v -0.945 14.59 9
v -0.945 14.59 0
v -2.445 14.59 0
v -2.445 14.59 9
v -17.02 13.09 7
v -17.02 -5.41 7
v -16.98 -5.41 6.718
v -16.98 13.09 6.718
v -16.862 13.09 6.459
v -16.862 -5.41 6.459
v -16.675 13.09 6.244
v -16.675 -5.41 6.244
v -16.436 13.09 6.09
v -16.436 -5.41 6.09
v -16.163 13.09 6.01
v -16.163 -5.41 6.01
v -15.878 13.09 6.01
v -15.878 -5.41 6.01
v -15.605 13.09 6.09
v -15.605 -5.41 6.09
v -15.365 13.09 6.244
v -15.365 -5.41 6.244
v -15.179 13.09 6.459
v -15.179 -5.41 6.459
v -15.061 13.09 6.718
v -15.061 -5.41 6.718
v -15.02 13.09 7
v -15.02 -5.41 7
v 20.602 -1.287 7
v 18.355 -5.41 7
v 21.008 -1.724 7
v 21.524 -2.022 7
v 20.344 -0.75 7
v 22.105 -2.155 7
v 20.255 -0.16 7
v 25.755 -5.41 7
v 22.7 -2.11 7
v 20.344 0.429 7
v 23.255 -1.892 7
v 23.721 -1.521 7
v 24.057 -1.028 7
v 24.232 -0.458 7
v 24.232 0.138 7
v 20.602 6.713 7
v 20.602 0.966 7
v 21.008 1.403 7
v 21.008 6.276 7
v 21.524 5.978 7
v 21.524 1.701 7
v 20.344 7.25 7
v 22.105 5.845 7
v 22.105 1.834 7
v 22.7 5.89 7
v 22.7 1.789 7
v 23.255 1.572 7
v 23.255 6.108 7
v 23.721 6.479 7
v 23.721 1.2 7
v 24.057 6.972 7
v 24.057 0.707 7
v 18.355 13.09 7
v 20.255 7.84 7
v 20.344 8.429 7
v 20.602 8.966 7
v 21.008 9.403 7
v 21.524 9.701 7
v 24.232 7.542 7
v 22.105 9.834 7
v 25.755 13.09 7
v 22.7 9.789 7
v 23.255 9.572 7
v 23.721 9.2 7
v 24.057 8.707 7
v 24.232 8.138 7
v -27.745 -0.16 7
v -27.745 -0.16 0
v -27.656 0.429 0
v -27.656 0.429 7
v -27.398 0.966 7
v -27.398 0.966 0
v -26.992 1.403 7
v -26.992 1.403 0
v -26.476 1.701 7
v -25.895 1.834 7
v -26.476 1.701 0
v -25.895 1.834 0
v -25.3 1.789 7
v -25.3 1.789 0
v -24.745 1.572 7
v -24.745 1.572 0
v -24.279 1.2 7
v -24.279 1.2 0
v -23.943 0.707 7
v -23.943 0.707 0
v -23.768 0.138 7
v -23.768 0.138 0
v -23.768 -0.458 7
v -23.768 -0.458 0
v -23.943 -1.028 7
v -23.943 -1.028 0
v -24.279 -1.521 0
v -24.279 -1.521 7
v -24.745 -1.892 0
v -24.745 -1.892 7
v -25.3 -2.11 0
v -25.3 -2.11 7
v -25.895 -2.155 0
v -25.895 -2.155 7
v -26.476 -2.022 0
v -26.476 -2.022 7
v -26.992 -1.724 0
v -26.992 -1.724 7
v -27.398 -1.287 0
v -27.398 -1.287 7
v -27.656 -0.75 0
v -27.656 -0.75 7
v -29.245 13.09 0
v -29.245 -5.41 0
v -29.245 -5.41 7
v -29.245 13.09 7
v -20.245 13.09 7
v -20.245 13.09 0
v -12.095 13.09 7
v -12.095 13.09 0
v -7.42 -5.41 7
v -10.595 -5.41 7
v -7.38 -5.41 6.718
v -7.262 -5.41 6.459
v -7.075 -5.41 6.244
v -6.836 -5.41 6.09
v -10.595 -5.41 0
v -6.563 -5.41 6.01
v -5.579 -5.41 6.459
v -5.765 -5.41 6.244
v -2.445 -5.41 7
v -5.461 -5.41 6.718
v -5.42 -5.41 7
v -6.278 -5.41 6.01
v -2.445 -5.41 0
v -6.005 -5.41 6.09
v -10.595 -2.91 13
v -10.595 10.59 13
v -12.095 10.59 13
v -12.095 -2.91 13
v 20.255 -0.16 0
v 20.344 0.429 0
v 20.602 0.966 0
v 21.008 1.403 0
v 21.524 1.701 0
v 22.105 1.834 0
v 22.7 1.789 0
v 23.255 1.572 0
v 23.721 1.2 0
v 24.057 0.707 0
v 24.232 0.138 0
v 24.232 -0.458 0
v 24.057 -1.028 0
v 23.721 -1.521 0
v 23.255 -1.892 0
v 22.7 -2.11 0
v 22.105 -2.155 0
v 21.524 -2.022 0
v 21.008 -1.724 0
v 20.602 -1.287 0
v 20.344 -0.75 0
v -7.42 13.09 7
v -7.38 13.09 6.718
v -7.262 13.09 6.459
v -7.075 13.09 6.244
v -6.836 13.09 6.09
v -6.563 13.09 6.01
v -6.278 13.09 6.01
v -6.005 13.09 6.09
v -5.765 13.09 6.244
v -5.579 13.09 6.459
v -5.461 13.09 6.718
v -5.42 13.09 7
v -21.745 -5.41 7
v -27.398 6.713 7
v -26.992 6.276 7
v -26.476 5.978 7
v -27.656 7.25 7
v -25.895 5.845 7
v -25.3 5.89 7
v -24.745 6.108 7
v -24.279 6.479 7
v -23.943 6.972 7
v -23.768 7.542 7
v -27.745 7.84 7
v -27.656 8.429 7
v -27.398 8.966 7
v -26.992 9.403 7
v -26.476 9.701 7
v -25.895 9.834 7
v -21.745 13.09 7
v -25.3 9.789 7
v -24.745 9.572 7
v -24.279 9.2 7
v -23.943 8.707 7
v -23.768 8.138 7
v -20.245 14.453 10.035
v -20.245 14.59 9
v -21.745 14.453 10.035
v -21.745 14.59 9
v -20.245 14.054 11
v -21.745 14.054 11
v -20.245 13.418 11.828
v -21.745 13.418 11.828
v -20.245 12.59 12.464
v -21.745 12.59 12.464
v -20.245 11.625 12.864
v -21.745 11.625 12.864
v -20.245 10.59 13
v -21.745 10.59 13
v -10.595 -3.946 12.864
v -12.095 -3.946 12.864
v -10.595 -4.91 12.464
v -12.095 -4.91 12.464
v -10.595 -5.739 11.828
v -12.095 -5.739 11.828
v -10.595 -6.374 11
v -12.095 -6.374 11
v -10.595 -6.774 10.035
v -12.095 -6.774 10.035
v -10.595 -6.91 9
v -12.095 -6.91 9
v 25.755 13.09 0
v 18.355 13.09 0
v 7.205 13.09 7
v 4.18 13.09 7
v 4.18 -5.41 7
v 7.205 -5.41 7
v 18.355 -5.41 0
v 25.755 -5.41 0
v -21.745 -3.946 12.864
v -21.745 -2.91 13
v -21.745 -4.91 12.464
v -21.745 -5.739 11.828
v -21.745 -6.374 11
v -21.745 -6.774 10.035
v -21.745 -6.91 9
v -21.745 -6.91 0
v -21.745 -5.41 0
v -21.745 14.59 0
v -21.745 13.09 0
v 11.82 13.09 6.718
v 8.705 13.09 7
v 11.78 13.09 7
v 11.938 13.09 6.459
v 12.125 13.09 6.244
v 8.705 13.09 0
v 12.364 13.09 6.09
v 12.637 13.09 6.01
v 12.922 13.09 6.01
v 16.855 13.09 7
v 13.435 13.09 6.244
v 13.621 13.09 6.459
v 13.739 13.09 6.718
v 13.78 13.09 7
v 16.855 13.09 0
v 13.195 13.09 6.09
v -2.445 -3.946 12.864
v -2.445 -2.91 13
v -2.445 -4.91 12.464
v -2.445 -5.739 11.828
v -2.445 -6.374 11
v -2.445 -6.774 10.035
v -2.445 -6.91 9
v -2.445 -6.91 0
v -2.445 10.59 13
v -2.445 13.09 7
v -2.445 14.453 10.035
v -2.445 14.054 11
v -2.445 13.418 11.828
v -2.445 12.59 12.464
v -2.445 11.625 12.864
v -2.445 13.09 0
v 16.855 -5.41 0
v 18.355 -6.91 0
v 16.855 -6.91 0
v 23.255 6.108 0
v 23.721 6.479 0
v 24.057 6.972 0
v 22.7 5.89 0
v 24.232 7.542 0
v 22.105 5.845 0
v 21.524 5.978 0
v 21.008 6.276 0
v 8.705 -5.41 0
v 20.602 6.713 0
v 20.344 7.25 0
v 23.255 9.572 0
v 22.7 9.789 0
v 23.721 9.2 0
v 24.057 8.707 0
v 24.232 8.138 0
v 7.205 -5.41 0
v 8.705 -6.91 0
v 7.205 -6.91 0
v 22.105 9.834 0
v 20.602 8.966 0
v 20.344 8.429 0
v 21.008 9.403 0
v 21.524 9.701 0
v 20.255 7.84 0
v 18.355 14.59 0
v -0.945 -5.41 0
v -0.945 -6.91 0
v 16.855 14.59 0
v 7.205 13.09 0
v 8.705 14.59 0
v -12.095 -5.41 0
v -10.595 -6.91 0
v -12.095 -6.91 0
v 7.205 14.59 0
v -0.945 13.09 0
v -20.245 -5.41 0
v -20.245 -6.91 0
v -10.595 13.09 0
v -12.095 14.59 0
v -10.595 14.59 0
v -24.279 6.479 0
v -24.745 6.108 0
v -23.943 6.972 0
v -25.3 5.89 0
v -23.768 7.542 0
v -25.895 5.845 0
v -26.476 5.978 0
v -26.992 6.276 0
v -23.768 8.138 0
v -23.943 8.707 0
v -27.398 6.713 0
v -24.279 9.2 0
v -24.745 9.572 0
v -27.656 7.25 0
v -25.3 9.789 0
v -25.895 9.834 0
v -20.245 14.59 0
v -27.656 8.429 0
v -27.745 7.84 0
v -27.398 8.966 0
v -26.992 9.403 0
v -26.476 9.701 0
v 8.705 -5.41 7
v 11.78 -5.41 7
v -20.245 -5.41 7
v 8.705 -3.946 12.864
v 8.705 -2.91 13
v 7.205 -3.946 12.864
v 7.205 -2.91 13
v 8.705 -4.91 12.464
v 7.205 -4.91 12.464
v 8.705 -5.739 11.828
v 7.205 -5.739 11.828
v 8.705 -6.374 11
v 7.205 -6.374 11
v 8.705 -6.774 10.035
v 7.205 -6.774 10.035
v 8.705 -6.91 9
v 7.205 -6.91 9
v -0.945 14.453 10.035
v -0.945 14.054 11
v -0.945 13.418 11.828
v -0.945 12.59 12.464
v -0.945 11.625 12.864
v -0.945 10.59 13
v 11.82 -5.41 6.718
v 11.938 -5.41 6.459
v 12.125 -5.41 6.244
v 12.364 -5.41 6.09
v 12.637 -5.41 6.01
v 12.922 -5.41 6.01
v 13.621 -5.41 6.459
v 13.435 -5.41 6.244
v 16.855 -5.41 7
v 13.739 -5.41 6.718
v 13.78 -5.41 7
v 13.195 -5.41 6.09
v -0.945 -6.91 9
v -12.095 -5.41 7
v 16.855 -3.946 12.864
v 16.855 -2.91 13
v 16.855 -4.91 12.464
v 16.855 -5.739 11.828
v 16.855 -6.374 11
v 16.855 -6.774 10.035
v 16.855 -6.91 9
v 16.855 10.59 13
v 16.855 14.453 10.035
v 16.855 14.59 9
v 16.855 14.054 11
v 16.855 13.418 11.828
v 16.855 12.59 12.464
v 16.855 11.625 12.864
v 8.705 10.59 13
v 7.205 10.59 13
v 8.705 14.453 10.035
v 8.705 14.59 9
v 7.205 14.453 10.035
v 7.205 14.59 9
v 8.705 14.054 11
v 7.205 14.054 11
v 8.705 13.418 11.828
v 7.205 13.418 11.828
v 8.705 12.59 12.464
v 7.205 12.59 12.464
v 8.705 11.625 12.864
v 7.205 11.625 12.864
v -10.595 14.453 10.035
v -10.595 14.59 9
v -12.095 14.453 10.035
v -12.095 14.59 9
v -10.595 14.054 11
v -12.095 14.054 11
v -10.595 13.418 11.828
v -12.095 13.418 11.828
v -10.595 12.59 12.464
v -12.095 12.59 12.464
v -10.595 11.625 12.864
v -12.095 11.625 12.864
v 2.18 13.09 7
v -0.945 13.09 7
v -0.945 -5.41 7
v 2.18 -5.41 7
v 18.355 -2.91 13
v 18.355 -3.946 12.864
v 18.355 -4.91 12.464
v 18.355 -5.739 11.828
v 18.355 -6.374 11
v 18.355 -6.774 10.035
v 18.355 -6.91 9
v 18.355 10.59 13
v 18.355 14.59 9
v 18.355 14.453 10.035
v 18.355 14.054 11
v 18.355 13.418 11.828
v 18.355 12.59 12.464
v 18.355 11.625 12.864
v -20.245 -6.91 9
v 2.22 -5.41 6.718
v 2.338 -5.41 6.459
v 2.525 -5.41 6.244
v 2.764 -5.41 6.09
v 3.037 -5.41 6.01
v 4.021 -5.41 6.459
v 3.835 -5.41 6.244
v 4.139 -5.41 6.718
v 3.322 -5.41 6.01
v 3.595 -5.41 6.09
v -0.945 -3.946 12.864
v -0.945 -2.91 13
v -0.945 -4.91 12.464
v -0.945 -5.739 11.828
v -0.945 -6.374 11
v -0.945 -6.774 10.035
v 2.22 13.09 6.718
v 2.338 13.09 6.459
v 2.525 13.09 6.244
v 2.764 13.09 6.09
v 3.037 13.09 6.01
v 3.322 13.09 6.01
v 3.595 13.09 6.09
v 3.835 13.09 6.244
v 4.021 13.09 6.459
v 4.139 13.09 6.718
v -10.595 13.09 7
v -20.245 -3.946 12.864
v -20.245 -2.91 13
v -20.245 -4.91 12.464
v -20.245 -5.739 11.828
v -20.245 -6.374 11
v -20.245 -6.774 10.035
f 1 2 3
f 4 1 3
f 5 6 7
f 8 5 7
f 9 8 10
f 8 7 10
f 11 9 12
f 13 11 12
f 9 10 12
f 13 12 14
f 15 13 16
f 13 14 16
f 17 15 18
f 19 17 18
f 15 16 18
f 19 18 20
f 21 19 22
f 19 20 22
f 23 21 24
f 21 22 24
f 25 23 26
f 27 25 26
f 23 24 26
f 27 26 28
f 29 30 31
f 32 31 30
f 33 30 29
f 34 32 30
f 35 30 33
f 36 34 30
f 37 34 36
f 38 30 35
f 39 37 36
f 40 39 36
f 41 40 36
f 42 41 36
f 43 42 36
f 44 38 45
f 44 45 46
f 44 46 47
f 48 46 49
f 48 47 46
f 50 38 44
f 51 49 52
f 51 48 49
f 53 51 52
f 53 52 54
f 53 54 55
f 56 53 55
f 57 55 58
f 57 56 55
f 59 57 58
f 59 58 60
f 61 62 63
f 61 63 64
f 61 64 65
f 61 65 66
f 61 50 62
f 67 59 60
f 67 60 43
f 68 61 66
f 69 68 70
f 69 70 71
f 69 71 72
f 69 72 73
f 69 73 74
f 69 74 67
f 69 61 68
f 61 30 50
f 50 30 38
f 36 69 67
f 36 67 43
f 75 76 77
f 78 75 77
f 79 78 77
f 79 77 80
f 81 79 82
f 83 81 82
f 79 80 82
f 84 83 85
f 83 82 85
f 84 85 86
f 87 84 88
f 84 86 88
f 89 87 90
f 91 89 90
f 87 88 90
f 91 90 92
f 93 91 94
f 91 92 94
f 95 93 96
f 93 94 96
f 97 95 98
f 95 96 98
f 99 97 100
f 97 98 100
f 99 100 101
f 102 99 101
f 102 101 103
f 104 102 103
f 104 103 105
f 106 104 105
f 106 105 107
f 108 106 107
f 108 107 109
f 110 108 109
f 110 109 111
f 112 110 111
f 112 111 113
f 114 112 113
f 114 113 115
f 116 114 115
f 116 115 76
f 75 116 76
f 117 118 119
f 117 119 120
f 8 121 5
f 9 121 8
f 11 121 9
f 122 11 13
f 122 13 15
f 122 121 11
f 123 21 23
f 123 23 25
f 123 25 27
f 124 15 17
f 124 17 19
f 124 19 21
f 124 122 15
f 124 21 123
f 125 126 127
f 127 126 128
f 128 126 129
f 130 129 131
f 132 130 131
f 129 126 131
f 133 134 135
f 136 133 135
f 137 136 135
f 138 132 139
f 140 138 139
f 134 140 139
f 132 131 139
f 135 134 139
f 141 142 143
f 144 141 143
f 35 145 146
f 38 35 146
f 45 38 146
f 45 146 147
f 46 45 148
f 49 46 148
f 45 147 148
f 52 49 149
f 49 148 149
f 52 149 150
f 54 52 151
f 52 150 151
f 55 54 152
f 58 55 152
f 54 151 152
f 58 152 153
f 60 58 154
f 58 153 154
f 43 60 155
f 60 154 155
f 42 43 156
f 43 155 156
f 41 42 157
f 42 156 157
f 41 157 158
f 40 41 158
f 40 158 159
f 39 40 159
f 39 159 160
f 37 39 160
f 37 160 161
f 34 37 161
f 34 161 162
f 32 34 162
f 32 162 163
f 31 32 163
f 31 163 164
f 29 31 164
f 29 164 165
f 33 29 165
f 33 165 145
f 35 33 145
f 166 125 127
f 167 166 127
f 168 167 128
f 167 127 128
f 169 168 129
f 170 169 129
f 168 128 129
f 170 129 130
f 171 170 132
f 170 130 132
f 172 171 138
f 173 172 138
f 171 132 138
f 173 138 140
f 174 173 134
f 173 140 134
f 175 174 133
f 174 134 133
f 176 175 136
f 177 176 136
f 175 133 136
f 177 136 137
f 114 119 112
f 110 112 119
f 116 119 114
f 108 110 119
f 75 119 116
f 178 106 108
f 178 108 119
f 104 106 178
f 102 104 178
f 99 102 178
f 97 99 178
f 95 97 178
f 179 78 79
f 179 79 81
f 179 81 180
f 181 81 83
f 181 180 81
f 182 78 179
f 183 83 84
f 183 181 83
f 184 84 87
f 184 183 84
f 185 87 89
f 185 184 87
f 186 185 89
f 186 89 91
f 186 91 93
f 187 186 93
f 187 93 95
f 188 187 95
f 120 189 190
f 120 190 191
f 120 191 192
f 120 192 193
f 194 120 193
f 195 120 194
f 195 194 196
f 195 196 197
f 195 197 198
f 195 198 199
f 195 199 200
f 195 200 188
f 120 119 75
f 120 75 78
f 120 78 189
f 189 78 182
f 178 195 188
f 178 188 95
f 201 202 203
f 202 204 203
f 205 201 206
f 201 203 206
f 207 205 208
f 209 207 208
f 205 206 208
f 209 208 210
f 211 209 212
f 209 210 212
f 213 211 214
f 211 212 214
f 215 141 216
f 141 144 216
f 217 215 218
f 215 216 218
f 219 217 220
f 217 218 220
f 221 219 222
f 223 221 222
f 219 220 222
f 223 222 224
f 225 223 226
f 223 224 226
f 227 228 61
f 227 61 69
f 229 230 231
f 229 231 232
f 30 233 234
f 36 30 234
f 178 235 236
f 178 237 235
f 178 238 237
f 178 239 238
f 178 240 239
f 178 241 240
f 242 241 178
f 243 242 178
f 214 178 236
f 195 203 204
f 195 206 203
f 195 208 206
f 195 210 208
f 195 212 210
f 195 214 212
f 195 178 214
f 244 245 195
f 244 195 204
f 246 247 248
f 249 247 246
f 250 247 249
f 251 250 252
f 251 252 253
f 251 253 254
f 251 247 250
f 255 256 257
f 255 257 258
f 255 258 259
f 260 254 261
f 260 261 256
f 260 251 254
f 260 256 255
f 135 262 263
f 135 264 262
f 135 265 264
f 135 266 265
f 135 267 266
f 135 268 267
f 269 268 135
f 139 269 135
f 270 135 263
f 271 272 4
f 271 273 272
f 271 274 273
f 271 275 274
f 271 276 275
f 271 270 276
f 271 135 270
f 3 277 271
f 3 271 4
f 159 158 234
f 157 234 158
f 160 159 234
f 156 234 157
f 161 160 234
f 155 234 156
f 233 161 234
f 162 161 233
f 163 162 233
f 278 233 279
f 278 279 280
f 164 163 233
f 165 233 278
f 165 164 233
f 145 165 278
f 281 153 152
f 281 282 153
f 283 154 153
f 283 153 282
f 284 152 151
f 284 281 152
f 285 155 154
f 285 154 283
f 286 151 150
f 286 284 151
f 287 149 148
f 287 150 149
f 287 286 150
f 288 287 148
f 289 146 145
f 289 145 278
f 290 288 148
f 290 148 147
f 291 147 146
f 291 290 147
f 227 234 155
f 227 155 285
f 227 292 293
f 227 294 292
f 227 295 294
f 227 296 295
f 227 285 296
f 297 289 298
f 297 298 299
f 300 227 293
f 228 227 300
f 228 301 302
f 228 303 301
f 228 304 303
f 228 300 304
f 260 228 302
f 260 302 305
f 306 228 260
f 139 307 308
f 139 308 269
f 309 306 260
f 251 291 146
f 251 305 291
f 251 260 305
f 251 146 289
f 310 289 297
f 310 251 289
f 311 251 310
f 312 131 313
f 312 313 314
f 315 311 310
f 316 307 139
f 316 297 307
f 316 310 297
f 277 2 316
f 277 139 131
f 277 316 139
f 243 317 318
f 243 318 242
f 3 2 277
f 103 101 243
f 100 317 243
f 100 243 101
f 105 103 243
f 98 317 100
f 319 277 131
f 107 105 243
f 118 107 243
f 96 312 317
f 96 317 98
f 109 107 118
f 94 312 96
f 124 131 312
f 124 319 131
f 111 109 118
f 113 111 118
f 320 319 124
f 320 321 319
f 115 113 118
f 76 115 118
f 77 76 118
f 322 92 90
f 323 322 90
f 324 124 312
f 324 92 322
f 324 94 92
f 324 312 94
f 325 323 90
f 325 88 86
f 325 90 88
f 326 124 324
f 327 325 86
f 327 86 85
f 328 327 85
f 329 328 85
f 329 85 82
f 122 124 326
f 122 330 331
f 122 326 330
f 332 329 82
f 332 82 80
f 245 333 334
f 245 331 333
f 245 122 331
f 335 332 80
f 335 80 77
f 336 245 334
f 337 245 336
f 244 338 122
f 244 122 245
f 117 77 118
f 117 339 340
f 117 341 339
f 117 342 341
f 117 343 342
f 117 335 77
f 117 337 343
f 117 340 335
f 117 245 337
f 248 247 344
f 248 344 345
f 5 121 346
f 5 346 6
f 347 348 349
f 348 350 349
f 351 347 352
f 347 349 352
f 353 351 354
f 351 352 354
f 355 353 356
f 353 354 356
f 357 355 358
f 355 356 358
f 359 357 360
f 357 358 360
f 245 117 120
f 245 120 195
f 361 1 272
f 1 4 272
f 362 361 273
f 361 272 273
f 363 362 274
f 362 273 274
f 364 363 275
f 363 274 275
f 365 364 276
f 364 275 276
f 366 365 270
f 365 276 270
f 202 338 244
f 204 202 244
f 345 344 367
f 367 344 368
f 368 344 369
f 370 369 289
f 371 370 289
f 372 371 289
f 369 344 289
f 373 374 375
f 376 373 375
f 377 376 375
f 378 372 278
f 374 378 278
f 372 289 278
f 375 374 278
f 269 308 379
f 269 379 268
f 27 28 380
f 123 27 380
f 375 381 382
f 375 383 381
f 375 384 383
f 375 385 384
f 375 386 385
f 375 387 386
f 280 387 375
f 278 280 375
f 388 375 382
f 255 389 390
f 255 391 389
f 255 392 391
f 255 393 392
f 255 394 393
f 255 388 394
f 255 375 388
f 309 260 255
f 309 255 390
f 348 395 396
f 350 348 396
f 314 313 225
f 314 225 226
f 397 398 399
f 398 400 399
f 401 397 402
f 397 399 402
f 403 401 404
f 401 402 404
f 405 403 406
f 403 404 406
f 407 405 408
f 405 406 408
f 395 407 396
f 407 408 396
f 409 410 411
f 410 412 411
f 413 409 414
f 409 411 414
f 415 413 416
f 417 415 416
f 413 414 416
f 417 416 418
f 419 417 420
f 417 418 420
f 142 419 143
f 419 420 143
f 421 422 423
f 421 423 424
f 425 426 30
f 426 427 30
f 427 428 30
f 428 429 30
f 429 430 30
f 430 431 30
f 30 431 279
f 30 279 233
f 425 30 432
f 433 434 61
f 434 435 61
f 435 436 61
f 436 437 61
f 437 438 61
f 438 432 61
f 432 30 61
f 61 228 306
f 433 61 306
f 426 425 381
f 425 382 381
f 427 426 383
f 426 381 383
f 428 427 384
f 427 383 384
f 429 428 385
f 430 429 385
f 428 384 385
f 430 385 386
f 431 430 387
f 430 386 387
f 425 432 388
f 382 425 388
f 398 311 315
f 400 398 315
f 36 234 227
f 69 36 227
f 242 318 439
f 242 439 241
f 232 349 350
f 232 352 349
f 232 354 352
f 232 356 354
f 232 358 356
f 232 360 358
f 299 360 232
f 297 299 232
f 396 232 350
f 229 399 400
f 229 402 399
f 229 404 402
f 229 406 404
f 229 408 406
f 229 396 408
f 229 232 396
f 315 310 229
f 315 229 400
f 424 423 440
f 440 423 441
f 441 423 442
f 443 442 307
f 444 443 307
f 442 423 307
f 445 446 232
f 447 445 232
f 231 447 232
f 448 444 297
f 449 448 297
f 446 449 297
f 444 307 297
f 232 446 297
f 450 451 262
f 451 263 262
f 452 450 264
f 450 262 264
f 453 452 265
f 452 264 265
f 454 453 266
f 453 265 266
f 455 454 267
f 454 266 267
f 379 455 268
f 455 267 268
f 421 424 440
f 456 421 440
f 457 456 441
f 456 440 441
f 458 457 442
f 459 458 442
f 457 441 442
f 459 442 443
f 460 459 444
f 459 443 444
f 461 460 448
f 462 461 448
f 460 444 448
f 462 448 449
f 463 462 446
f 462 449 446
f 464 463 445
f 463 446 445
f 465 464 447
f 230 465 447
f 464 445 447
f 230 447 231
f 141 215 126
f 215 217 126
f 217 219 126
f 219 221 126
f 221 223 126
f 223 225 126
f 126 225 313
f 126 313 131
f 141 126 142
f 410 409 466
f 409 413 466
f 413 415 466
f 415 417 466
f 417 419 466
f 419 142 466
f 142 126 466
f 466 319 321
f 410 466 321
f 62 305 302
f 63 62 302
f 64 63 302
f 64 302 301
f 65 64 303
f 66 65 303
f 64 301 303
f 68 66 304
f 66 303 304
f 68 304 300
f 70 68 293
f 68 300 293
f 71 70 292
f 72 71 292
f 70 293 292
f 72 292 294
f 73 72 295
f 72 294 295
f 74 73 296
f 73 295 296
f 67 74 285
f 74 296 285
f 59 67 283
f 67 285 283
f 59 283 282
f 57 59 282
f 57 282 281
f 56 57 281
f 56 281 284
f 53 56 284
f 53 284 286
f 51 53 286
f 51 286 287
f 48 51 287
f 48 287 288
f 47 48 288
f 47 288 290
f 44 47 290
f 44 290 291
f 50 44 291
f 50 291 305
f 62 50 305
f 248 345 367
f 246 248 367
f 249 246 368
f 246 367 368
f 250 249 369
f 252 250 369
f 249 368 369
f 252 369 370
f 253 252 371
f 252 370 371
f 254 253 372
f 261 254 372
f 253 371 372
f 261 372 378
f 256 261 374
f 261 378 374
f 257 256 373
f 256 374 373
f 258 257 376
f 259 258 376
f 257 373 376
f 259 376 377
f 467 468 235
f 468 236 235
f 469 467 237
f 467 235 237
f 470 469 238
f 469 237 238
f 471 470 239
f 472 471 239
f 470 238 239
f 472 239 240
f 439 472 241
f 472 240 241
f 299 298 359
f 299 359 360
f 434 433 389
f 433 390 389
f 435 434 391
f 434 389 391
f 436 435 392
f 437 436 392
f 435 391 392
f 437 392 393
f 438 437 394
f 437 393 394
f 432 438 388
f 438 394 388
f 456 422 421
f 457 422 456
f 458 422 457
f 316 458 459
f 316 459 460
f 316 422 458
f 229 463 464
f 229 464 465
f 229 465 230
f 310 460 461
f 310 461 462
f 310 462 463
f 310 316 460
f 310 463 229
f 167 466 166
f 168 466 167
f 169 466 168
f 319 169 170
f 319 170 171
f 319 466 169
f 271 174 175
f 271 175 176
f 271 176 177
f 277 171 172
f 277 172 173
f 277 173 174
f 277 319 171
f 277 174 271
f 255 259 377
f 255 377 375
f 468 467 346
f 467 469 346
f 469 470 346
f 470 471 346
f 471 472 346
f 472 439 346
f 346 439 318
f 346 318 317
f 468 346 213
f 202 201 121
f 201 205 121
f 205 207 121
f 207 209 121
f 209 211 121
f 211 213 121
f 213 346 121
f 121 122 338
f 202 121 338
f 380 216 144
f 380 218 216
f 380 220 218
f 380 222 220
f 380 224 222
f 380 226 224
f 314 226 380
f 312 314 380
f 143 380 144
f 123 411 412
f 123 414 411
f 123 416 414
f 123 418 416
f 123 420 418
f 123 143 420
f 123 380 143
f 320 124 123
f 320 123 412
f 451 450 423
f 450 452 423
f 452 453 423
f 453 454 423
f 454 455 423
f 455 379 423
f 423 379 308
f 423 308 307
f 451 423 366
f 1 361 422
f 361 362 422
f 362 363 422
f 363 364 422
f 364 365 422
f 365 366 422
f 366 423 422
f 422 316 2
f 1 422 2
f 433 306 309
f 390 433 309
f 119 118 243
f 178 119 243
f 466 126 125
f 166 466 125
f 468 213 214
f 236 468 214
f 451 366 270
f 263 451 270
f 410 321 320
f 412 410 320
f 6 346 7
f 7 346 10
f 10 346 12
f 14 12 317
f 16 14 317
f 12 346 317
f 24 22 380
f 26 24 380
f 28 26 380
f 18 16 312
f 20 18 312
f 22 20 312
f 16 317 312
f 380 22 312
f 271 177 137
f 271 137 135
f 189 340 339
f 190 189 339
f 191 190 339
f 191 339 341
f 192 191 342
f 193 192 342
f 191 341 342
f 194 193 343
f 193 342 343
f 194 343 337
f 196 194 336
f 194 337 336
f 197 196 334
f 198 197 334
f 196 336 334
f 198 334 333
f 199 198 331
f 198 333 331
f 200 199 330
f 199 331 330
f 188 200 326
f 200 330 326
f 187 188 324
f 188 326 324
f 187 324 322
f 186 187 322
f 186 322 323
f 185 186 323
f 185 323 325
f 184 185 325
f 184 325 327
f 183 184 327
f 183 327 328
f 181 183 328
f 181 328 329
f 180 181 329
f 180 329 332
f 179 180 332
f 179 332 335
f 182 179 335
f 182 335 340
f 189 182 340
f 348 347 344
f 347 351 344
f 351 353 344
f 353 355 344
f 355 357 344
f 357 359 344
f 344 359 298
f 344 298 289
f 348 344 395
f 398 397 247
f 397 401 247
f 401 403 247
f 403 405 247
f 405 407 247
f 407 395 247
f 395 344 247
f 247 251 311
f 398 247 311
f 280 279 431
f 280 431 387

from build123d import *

# Parameters (mm, degrees)
ESQUISSE1_W                = 55
ESQUISSE1_H                = 18.5
BOSS_EXTRU_1_DEPTH         = 7
ENL_V_MAT_EXTRU_1_REACH    = 9
ESQUISSE2_R                = 2
ESQUISSE3_W                = 1.5
ESQUISSE3_H                = 21.5
BOSS_EXTRU_2_DEPTH         = 13
CONG_1_R                   = 4
ESQUISSE4_R                = 1
ENL_V_MAT_EXTRU_2_DEPTH    = 18.5
R_P_TITION_LIN_AIRE1_COUNT = 4
R_P_TITION_LIN_AIRE1_PITCH = 9.6


with BuildPart() as part:
    # Esquisse1 → Boss.-Extru.1 (new body)
    with BuildSketch(Plane.XY):
        with Locations((-1.745283019, 3.839622642)):
            Rectangle(ESQUISSE1_W, ESQUISSE1_H)
    extrude(amount=BOSS_EXTRU_1_DEPTH)

    # Esquisse2 → Enlèv. mat.-Extru.1 (cut, up to next)
    with BuildSketch(Plane(origin=(0, 0, 0), x_dir=(-1, 0, 0), z_dir=(0, 0, -1)), mode=Mode.PRIVATE) as enl_v_mat_extru_1_sk1:
        with Locations((-22.254716981, 7.839622642)):
            Circle(ESQUISSE2_R)
    enl_v_mat_extru_1_tool1 = extrude(enl_v_mat_extru_1_sk1.sketch, amount=-ENL_V_MAT_EXTRU_1_REACH, mode=Mode.PRIVATE) & part.part
    add(enl_v_mat_extru_1_tool1.solids().sort_by_distance((22.254717, 7.839623, 0))[0], mode=Mode.SUBTRACT)
    # Esquisse2 → Enlèv. mat.-Extru.1 (cut, up to next)
    with BuildSketch(Plane(origin=(0, 0, 0), x_dir=(-1, 0, 0), z_dir=(0, 0, -1)), mode=Mode.PRIVATE) as enl_v_mat_extru_1_sk2:
        with Locations((-22.254716981, -0.160377358)):
            Circle(ESQUISSE2_R)
    enl_v_mat_extru_1_tool2 = extrude(enl_v_mat_extru_1_sk2.sketch, amount=-ENL_V_MAT_EXTRU_1_REACH, mode=Mode.PRIVATE) & part.part
    add(enl_v_mat_extru_1_tool2.solids().sort_by_distance((22.254717, -0.160377, 0))[0], mode=Mode.SUBTRACT)
    # Esquisse2 → Enlèv. mat.-Extru.1 (cut, up to next)
    with BuildSketch(Plane(origin=(0, 0, 0), x_dir=(-1, 0, 0), z_dir=(0, 0, -1)), mode=Mode.PRIVATE) as enl_v_mat_extru_1_sk3:
        with Locations((25.745283019, -0.160377358)):
            Circle(ESQUISSE2_R)
    enl_v_mat_extru_1_tool3 = extrude(enl_v_mat_extru_1_sk3.sketch, amount=-ENL_V_MAT_EXTRU_1_REACH, mode=Mode.PRIVATE) & part.part
    add(enl_v_mat_extru_1_tool3.solids().sort_by_distance((-25.745283, -0.160377, 0))[0], mode=Mode.SUBTRACT)
    # Esquisse2 → Enlèv. mat.-Extru.1 (cut, up to next)
    with BuildSketch(Plane(origin=(0, 0, 0), x_dir=(-1, 0, 0), z_dir=(0, 0, -1)), mode=Mode.PRIVATE) as enl_v_mat_extru_1_sk4:
        with Locations((25.745283019, 7.839622642)):
            Circle(ESQUISSE2_R)
    enl_v_mat_extru_1_tool4 = extrude(enl_v_mat_extru_1_sk4.sketch, amount=-ENL_V_MAT_EXTRU_1_REACH, mode=Mode.PRIVATE) & part.part
    add(enl_v_mat_extru_1_tool4.solids().sort_by_distance((-25.745283, 7.839623, 0))[0], mode=Mode.SUBTRACT)

    # Esquisse3 → Boss.-Extru.2 (add)
    with BuildSketch(Plane(origin=(0, 0, 0), x_dir=(-1, 0, 0), z_dir=(0, 0, -1))):
        with Locations((20.995283019, 3.839622642)):
            Rectangle(ESQUISSE3_W, ESQUISSE3_H)
        with Locations((11.345283019, 3.839622642)):
            Rectangle(ESQUISSE3_W, ESQUISSE3_H)
        with Locations((1.695283019, 3.839622642)):
            Rectangle(ESQUISSE3_W, ESQUISSE3_H)
        with Locations((-7.954716981, 3.839622642)):
            Rectangle(ESQUISSE3_W, ESQUISSE3_H)
        with Locations((-17.604716981, 3.839622642)):
            Rectangle(ESQUISSE3_W, ESQUISSE3_H)
    extrude(amount=-BOSS_EXTRU_2_DEPTH)

    # Congé1
    cong_1_edges = [part.edges().sort_by_distance(p)[0] for p in [
        (17.604716981, -6.910377358, 13),
        (17.604716981, 14.589622642, 13),
        (-20.995283019, -6.910377358, 13),
        (-20.995283019, 14.589622642, 13),
        (-11.345283019, -6.910377358, 13),
        (-11.345283019, 14.589622642, 13),
        (-1.695283019, -6.910377358, 13),
        (-1.695283019, 14.589622642, 13),
        (7.954716981, -6.910377358, 13),
        (7.954716981, 14.589622642, 13),
    ]]
    fillet(cong_1_edges, radius=CONG_1_R)

    # Esquisse4 → Enlèv. mat.-Extru.2 (cut)
    with BuildSketch(Plane.XZ.offset(5.410377358)):
        with Locations((12.779716981, 7)):
            Circle(ESQUISSE4_R)
    enl_v_mat_extru_2 = extrude(amount=-ENL_V_MAT_EXTRU_2_DEPTH, mode=Mode.SUBTRACT)

    # Répétition linéaire1: Enlèv. mat.-Extru.2 ×4
    with Locations(*[(-i * R_P_TITION_LIN_AIRE1_PITCH, 0, 0) for i in range(1, R_P_TITION_LIN_AIRE1_COUNT)]):
        add(enl_v_mat_extru_2, mode=Mode.SUBTRACT)


solid = part.part
